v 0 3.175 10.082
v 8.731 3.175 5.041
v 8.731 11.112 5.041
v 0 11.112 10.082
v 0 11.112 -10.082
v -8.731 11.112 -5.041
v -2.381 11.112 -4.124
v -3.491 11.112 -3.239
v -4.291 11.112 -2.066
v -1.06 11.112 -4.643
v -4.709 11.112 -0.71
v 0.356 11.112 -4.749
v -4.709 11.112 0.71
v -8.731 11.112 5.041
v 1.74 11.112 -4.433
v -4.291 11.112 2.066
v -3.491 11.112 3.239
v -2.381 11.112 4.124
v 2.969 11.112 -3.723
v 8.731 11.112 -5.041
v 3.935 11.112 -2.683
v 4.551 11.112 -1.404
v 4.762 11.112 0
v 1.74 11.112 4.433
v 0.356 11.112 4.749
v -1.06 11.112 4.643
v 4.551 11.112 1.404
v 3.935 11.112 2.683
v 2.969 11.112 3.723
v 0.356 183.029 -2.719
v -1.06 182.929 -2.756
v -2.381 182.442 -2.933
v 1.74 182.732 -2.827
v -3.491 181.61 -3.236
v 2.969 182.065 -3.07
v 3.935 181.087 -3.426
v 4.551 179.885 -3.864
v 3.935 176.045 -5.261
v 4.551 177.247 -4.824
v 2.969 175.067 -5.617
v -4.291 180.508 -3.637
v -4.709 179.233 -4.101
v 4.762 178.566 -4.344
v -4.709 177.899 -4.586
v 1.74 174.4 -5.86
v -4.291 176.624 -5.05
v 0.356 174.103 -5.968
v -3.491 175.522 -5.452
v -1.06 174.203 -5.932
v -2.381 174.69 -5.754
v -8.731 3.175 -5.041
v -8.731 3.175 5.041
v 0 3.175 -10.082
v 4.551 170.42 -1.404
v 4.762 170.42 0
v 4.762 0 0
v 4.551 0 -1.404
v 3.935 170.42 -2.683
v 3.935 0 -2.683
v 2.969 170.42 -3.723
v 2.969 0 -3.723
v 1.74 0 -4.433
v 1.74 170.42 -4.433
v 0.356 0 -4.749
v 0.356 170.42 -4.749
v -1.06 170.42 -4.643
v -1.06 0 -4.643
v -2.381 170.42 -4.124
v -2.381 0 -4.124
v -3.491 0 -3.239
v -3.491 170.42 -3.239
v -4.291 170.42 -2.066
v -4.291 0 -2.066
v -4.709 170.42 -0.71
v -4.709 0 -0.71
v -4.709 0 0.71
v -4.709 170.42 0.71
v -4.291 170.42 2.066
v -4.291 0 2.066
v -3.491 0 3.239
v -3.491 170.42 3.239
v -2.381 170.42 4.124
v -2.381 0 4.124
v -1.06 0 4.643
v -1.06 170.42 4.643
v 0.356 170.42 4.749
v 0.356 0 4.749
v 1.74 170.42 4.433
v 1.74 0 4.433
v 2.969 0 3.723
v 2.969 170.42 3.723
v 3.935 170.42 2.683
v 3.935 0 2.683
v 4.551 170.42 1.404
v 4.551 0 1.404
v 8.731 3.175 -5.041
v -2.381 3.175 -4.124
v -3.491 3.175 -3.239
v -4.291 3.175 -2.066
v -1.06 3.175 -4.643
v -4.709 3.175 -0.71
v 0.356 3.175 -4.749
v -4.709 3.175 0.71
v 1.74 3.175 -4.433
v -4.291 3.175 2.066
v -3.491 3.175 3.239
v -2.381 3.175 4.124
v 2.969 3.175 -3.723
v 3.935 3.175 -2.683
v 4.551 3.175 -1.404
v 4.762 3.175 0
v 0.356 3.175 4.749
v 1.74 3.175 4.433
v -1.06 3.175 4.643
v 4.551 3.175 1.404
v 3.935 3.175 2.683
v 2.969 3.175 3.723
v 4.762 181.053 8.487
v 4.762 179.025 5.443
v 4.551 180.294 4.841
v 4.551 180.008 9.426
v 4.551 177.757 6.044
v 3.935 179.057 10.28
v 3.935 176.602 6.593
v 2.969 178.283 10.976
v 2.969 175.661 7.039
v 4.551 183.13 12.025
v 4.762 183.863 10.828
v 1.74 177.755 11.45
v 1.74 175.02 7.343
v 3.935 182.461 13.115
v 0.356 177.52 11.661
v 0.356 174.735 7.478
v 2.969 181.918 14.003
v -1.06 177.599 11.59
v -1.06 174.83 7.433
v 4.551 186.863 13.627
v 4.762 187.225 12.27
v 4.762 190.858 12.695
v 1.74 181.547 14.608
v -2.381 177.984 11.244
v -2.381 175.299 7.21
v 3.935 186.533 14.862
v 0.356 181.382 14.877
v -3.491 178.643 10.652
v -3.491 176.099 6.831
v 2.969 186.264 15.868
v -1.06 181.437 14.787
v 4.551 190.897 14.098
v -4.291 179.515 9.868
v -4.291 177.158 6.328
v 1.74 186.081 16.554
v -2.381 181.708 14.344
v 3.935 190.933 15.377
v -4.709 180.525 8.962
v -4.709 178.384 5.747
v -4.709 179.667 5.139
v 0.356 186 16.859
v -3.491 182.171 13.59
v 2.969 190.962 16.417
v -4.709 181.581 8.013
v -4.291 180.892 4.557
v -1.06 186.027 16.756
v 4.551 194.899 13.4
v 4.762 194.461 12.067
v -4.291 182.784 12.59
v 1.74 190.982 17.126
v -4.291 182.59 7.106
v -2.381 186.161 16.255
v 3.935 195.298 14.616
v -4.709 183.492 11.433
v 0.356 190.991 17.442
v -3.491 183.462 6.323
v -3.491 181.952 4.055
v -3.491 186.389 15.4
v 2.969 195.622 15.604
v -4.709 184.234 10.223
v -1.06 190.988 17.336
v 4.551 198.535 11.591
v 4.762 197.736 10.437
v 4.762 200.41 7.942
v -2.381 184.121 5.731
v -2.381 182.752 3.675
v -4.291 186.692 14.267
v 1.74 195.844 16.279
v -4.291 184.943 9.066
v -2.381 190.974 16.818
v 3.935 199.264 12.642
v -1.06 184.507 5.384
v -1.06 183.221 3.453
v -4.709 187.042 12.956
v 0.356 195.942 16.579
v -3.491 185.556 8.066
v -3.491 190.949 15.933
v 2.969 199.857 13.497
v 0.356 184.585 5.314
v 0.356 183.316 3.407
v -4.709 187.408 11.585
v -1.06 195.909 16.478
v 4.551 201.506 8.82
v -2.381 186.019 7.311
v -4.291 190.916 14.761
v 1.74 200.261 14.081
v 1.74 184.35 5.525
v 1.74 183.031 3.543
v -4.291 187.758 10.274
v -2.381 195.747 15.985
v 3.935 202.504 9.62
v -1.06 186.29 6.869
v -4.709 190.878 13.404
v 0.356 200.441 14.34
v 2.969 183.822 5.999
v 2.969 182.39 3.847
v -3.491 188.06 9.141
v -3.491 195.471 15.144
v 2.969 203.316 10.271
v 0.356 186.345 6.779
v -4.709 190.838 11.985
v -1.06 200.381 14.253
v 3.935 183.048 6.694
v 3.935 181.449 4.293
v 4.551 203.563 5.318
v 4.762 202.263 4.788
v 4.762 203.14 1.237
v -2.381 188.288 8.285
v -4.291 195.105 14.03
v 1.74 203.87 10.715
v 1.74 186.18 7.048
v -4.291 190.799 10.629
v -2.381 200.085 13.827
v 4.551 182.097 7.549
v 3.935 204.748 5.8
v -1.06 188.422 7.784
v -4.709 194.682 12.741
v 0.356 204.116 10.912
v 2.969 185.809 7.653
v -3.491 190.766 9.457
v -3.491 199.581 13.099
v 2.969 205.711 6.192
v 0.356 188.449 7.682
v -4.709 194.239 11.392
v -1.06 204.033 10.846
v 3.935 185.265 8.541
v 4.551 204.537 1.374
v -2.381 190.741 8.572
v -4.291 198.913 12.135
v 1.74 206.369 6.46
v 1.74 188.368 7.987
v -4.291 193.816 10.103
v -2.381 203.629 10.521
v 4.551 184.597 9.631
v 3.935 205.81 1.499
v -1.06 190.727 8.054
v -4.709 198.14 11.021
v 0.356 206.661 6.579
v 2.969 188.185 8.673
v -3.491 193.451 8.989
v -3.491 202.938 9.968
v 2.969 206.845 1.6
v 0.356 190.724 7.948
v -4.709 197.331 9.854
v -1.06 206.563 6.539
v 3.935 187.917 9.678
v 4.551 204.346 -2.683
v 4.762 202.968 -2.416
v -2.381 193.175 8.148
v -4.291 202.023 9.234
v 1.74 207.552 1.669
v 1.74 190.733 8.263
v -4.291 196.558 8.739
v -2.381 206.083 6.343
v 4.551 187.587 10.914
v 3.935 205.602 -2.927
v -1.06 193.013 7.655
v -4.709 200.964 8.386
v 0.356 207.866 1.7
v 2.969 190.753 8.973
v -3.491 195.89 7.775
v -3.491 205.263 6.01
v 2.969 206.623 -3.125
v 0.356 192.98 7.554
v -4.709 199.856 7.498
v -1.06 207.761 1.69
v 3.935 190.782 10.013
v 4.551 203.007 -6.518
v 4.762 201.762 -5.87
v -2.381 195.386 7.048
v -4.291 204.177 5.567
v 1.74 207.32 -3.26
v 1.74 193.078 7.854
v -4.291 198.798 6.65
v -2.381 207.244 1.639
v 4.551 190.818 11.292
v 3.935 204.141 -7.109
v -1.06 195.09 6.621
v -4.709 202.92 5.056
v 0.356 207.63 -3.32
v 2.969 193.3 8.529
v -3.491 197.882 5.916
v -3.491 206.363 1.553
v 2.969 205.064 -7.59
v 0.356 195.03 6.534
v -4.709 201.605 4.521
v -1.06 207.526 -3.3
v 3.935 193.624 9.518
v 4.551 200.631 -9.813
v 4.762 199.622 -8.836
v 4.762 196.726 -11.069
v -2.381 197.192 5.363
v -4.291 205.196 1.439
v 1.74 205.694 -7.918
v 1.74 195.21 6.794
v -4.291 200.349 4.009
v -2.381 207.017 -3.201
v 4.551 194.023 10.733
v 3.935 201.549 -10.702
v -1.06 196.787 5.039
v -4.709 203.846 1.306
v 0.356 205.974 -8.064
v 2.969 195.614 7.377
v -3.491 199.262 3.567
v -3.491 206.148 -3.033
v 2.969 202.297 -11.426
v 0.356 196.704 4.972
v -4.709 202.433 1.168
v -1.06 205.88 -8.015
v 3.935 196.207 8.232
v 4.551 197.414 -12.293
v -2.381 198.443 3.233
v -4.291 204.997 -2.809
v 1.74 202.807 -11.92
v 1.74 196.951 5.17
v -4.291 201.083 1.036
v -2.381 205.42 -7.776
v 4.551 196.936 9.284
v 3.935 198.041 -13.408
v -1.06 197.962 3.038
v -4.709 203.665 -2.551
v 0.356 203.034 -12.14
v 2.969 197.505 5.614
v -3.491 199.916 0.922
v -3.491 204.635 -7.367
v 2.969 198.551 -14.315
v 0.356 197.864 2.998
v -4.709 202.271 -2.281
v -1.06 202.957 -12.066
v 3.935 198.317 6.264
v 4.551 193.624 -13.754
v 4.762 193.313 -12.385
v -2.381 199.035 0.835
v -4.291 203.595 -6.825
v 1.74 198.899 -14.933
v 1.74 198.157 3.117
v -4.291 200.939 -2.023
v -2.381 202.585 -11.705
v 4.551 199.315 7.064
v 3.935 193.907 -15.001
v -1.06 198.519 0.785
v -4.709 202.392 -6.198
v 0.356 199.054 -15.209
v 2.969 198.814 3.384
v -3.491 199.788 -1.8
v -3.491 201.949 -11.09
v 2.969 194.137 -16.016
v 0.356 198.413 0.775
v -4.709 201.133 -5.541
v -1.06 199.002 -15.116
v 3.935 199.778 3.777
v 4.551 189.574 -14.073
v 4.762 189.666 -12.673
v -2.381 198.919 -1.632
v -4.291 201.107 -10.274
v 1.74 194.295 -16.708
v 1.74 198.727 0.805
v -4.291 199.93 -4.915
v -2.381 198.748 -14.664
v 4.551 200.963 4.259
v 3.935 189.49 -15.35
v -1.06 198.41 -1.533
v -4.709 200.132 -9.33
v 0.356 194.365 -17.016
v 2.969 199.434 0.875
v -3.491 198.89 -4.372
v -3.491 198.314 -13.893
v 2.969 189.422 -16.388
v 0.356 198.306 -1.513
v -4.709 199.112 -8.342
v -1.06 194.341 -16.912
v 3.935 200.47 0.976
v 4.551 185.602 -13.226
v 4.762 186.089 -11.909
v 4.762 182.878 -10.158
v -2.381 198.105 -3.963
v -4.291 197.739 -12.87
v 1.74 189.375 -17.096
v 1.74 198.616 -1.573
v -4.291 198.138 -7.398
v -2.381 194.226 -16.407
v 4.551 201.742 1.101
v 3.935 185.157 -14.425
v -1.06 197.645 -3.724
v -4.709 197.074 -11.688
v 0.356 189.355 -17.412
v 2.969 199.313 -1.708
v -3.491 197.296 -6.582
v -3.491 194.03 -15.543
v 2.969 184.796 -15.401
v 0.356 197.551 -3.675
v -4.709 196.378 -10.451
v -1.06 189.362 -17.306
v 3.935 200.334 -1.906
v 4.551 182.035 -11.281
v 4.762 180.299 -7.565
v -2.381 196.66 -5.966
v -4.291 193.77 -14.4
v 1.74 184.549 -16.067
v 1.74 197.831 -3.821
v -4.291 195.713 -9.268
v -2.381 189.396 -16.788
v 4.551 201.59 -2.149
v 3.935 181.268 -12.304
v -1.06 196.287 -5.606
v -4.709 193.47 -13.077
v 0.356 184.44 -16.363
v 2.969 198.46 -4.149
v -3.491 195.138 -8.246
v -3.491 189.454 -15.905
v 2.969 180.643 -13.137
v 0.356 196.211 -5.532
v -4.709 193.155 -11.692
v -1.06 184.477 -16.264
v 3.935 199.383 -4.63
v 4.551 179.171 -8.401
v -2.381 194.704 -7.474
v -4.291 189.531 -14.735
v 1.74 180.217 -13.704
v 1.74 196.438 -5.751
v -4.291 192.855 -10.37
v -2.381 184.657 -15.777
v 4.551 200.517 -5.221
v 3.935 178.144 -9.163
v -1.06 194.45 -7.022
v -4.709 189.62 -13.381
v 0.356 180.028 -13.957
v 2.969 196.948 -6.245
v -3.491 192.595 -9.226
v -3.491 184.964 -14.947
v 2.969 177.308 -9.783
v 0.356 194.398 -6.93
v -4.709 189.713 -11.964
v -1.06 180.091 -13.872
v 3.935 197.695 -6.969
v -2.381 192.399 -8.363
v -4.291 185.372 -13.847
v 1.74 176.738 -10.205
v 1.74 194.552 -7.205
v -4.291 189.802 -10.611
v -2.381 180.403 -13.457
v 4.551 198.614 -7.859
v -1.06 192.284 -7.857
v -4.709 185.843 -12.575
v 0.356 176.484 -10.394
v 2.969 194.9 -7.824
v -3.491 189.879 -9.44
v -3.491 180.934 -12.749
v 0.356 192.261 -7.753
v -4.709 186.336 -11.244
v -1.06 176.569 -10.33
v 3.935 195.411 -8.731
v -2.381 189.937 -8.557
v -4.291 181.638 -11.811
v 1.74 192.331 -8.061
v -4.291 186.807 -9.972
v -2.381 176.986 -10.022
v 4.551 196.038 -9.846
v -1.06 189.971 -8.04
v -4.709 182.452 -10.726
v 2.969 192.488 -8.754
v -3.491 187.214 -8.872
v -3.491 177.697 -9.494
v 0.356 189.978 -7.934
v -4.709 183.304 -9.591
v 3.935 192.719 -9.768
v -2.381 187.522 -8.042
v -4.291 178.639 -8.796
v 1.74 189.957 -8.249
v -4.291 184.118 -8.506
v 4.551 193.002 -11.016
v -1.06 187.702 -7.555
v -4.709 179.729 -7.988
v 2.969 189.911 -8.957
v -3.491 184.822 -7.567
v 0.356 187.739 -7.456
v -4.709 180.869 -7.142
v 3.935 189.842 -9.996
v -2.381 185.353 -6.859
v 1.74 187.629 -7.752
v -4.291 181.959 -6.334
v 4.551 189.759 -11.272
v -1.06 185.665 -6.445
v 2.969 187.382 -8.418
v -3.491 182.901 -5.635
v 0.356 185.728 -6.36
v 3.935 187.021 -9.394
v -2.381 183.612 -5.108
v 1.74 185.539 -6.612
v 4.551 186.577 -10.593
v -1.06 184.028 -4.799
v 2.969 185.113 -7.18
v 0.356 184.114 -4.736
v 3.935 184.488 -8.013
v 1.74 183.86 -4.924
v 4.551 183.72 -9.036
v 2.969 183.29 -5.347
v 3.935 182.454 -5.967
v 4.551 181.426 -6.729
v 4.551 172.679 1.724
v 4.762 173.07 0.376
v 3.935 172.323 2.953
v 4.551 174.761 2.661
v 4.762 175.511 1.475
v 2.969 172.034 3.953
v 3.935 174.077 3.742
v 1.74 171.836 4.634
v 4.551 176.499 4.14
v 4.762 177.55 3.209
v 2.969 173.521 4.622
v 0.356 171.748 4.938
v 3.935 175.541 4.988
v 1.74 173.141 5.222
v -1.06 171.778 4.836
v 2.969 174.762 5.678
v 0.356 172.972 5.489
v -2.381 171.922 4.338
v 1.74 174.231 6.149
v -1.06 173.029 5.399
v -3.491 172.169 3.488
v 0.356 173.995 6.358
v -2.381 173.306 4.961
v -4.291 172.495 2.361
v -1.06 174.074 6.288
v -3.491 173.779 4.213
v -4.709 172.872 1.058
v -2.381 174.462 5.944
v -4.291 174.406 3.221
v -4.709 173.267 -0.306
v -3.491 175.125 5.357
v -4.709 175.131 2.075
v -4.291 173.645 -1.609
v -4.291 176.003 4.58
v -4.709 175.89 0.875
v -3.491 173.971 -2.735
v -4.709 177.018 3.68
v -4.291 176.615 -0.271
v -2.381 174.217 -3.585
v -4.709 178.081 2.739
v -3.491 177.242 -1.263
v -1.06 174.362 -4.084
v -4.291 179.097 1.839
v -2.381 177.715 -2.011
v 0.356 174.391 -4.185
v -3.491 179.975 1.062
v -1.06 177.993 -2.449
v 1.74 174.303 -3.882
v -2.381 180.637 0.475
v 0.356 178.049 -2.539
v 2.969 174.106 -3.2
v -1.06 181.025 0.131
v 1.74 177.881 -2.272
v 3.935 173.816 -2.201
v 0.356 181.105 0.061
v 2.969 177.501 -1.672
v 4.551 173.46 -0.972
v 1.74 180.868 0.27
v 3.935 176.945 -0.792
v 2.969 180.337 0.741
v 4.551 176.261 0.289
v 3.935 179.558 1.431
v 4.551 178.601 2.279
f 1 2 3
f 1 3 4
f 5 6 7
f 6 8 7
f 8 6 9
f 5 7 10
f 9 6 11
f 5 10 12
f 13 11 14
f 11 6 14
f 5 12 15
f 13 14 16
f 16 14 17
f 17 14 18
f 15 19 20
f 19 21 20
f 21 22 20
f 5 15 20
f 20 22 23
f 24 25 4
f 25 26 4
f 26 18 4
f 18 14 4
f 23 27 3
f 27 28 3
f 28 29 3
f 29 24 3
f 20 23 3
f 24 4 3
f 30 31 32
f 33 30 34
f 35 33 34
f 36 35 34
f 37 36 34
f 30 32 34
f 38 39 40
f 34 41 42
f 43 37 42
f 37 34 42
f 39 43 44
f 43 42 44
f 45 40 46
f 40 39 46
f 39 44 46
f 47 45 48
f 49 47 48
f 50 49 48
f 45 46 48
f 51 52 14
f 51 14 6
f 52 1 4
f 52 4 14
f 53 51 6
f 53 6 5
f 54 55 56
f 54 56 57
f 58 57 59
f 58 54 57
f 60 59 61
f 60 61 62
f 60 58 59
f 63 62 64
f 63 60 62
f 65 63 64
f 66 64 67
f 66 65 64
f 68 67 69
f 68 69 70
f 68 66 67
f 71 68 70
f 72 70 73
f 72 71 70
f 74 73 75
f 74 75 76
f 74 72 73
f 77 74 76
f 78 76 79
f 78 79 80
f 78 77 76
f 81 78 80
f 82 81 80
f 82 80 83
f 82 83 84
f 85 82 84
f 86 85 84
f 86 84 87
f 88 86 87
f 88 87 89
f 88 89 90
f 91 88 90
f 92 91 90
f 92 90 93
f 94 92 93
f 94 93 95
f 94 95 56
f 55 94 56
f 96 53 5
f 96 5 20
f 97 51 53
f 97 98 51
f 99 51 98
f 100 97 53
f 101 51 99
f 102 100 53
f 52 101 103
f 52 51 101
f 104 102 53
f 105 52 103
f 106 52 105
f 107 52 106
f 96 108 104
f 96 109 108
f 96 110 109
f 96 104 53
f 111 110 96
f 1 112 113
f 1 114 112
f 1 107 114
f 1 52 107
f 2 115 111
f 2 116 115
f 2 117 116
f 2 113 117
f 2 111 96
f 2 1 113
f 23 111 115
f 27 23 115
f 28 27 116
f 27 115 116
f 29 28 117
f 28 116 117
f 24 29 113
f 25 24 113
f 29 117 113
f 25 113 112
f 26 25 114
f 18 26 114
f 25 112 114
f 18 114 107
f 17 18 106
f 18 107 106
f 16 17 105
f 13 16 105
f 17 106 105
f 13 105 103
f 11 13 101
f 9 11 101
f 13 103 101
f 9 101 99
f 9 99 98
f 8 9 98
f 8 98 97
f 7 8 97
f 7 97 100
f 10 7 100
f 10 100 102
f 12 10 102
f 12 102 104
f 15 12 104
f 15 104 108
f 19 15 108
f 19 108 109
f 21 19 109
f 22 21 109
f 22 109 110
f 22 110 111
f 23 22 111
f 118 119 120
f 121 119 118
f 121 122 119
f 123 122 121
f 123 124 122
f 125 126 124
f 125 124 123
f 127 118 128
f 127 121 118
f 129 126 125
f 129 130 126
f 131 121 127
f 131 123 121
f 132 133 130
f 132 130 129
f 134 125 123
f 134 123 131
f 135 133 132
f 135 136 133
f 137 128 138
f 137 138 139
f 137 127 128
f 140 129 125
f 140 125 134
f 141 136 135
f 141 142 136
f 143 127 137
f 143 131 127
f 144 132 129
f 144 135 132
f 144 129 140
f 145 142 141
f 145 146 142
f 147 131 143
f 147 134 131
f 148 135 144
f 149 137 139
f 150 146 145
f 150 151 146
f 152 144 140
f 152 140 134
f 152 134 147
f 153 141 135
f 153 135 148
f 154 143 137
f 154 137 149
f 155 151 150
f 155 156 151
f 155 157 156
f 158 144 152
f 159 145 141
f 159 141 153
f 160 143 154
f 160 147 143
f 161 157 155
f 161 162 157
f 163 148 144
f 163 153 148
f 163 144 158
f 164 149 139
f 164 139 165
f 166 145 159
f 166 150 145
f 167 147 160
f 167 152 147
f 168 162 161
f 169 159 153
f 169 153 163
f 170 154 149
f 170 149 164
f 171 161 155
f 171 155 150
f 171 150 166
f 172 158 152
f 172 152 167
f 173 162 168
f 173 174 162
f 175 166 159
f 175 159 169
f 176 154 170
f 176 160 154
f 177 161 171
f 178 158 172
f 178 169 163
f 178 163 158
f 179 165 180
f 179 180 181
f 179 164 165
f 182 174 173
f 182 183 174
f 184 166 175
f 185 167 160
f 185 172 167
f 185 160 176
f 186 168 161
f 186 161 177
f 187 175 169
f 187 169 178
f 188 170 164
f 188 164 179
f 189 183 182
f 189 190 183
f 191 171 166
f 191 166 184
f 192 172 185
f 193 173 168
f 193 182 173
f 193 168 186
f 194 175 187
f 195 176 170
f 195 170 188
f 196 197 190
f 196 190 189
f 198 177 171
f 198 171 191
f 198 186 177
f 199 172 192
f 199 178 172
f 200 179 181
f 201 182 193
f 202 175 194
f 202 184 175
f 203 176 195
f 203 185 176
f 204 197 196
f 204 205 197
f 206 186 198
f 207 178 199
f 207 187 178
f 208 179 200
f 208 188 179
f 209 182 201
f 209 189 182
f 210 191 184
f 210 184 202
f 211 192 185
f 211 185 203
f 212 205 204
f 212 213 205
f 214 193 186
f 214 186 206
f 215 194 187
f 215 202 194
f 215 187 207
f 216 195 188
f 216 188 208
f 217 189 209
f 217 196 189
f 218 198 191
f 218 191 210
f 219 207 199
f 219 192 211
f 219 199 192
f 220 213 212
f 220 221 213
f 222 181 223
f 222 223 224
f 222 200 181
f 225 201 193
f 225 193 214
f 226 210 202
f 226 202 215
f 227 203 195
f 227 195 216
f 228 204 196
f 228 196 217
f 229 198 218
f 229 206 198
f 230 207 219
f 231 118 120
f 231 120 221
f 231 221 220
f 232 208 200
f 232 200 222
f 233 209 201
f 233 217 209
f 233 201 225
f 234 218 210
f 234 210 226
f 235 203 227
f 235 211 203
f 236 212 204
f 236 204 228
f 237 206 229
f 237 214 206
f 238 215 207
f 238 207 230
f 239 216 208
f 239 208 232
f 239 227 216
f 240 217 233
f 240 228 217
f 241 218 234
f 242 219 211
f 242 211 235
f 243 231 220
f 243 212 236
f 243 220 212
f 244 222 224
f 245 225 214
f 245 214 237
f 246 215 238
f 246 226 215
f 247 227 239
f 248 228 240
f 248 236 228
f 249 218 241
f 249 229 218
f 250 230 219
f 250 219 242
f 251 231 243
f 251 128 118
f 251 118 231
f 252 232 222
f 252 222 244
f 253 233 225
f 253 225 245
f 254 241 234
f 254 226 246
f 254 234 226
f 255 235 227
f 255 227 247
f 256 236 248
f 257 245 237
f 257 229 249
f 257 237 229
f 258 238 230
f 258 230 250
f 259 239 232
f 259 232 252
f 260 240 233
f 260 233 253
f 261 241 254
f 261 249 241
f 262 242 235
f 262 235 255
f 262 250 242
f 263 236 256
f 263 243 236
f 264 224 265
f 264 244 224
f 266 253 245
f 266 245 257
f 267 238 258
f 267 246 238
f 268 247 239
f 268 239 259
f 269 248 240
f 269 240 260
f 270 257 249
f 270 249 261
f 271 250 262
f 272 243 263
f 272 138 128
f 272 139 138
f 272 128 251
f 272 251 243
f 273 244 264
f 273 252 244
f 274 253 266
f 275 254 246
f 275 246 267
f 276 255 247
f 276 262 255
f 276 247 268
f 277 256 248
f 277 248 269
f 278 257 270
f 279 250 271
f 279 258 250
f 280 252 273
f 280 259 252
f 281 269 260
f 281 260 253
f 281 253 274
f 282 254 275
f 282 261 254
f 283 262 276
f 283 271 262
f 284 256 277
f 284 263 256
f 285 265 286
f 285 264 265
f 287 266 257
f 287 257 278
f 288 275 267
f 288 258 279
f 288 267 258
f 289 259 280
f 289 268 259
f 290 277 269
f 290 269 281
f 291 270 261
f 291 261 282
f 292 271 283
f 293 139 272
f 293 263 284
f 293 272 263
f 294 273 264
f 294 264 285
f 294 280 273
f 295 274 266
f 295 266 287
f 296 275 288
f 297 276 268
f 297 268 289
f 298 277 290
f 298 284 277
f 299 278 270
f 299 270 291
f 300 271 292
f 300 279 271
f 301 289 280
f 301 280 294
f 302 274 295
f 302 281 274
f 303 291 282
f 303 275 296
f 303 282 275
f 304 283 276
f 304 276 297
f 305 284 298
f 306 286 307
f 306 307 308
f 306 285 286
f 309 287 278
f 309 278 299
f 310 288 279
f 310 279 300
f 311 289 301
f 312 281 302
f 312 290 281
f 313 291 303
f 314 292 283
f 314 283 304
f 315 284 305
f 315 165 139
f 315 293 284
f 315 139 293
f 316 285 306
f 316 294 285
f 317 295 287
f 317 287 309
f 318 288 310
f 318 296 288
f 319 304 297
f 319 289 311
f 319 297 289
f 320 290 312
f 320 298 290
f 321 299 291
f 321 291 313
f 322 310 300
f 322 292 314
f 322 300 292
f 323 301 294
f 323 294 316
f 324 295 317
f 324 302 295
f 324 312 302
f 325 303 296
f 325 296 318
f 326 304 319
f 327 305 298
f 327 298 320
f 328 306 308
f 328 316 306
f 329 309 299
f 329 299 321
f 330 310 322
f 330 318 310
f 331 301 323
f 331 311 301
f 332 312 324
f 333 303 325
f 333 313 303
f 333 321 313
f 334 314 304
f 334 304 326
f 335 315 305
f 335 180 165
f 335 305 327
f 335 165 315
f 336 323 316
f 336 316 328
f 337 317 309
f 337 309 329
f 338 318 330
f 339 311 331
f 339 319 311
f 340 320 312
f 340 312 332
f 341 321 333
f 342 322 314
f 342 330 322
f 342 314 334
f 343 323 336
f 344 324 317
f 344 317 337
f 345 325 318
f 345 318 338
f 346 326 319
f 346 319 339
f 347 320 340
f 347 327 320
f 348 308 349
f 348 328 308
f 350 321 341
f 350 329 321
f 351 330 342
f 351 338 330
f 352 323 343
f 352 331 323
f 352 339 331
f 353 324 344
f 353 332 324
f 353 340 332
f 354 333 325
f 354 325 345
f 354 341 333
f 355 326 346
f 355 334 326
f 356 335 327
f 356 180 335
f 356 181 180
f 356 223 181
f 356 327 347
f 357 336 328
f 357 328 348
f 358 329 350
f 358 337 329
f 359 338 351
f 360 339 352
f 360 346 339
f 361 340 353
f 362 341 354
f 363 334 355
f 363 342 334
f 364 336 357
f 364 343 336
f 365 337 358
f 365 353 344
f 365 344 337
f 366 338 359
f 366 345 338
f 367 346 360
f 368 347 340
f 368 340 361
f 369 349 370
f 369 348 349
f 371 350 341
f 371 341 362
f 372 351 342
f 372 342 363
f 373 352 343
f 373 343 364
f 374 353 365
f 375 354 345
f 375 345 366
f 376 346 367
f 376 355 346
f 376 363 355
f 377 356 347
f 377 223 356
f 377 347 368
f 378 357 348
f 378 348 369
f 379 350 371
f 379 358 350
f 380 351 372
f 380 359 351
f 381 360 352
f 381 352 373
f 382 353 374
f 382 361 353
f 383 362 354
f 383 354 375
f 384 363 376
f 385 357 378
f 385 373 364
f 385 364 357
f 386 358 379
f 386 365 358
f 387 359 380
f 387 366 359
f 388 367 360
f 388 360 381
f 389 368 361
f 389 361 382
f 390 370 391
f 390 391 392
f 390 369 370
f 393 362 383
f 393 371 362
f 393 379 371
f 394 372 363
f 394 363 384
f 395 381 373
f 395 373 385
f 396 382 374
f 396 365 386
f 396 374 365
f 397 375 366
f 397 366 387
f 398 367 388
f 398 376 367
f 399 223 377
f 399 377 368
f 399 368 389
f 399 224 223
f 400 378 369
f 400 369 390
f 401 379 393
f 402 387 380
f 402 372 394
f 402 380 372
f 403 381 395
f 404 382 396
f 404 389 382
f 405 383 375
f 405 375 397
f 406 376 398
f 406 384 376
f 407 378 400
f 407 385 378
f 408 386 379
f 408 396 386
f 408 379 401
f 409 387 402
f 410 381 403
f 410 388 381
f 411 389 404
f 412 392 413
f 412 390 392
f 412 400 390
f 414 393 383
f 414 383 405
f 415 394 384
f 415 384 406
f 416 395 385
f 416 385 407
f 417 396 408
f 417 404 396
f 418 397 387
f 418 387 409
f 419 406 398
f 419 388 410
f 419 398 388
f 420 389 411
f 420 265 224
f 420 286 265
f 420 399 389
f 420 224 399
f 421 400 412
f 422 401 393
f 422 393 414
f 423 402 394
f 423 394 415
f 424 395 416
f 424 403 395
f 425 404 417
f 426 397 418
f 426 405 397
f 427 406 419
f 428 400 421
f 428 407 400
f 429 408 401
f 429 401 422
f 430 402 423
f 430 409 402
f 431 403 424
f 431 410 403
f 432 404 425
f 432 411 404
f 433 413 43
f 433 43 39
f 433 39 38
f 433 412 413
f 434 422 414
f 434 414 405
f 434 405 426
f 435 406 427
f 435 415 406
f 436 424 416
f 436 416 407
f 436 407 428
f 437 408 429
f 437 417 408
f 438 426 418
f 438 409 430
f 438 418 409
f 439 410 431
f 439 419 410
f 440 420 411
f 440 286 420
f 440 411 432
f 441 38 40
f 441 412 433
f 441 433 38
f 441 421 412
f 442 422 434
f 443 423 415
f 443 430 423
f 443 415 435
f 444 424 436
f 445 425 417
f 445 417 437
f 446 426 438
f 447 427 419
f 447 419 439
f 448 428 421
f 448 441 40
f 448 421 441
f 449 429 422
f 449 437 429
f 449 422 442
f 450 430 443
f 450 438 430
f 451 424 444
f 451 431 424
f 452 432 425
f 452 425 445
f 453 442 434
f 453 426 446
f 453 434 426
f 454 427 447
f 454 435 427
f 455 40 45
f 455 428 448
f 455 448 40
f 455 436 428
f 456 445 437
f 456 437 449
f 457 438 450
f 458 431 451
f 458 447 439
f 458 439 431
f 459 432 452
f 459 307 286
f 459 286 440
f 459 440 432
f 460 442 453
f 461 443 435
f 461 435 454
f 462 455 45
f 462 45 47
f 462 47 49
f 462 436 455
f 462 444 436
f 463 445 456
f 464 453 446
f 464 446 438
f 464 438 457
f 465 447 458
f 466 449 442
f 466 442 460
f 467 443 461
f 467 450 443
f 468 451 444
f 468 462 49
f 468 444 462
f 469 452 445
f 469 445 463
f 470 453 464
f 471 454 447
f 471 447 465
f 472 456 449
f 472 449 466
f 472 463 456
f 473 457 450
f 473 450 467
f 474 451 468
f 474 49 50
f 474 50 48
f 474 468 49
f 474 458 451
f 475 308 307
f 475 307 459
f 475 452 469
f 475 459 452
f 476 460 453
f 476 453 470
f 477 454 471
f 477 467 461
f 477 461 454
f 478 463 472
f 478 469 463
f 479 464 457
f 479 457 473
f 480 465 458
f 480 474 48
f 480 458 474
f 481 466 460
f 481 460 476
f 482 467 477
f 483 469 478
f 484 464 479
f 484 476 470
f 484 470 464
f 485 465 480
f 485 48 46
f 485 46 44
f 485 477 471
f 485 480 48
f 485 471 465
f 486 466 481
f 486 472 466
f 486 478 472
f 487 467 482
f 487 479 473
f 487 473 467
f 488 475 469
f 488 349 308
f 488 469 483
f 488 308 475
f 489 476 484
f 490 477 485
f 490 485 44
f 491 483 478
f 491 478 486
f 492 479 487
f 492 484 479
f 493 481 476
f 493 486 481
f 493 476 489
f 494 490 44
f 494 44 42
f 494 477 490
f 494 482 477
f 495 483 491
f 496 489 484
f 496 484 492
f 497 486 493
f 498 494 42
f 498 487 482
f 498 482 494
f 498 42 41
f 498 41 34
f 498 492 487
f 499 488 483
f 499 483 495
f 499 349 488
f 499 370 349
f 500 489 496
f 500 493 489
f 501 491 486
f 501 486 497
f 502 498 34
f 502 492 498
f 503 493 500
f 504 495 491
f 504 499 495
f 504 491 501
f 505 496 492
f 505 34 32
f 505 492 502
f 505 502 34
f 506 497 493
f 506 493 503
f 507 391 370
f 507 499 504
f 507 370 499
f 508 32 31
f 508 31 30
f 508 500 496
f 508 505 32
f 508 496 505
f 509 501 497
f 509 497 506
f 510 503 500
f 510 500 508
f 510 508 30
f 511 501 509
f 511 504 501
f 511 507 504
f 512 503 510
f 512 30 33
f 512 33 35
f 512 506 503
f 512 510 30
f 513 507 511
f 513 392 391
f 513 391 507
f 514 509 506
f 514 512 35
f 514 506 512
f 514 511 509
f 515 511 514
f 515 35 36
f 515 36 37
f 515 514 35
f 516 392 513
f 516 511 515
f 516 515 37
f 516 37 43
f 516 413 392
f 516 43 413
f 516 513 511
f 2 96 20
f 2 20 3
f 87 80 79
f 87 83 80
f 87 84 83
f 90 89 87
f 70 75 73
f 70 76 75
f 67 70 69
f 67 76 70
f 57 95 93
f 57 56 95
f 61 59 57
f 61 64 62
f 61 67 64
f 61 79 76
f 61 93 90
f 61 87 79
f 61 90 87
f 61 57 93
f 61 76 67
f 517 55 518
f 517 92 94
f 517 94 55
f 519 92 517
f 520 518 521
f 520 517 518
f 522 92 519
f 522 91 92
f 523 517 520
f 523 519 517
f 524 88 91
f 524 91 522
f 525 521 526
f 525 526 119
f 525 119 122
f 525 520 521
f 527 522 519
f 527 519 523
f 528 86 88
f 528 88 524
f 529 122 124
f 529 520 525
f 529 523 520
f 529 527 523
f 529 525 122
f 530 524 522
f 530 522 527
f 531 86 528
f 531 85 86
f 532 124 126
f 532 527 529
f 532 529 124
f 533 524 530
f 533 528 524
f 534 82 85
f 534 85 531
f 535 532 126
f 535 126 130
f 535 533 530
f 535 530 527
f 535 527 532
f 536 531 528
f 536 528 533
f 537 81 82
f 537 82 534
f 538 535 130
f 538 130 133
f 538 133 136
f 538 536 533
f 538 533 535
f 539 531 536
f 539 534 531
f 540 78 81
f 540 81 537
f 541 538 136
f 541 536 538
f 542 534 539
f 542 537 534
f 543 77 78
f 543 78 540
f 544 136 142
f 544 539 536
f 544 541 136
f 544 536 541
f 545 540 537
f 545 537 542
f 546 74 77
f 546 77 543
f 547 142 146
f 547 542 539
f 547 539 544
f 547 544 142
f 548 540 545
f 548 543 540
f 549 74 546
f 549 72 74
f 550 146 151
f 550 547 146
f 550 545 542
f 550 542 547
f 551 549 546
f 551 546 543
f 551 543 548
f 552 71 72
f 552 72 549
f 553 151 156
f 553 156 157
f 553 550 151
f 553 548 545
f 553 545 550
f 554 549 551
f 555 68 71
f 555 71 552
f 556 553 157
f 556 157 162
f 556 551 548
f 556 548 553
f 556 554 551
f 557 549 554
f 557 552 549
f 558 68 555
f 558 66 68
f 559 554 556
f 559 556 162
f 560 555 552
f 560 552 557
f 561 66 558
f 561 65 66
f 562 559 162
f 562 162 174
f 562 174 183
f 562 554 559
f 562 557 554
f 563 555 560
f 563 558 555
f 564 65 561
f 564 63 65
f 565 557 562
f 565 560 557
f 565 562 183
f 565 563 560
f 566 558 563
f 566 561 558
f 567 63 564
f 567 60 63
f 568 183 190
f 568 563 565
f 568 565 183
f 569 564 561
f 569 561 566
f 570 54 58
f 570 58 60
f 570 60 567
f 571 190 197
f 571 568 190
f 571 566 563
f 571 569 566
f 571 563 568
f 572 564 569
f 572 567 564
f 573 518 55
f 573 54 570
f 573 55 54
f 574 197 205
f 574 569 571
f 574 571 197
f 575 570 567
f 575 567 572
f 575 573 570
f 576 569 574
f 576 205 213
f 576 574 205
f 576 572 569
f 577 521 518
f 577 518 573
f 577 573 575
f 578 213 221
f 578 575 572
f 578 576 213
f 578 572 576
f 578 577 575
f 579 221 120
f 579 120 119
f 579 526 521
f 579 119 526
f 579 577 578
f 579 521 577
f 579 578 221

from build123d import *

# Parameters (mm, degrees)
F1_R     = 4.7625
F3_R     = 4.7625
F4_DEPTH = 11.1125
F5_DEPTH = 3.175


with BuildPart() as f2:
    # F2: sweep along a path in F0
    with BuildLine(Plane.YZ) as f2_path:
        Line((0, 0), (170.4195368579, 0))
        ThreePointArc((170.4195368579, 0), (175.5108635164, 1.4749057237), (179.0254496331, 5.4428571429))
        ThreePointArc((179.0254496331, 5.4428571429), (203.1860215789, -0.5956983292), (178.565903716, -4.3436558202))
    # F1 (on Front) → F2 (sweep)
    with BuildSketch(Plane.XZ):
        Circle(F1_R)
    sweep(path=f2_path.line)


with BuildPart() as f4:
    # F3 (on face) → F4 (new body)
    with BuildSketch(Plane.XZ):
        Polygon((8.73125, -5.0409895379), (8.73125, 5.0409895379), (0, 10.0819790757), (-8.73125, 5.0409895379), (-8.73125, -5.0409895379), (0, -10.0819790757), align=None)
        Circle(F3_R, mode=Mode.SUBTRACT)
    extrude(amount=-F4_DEPTH)

    # F5 (cut): a face of the model
    f5_faces = [f4.faces().sort_by_distance(p)[0] for p in [
        (8.4645059064, 0, 0),
    ]]
    extrude(f5_faces, amount=-F5_DEPTH, mode=Mode.SUBTRACT)


solid = Compound([f2.part, f4.part])
